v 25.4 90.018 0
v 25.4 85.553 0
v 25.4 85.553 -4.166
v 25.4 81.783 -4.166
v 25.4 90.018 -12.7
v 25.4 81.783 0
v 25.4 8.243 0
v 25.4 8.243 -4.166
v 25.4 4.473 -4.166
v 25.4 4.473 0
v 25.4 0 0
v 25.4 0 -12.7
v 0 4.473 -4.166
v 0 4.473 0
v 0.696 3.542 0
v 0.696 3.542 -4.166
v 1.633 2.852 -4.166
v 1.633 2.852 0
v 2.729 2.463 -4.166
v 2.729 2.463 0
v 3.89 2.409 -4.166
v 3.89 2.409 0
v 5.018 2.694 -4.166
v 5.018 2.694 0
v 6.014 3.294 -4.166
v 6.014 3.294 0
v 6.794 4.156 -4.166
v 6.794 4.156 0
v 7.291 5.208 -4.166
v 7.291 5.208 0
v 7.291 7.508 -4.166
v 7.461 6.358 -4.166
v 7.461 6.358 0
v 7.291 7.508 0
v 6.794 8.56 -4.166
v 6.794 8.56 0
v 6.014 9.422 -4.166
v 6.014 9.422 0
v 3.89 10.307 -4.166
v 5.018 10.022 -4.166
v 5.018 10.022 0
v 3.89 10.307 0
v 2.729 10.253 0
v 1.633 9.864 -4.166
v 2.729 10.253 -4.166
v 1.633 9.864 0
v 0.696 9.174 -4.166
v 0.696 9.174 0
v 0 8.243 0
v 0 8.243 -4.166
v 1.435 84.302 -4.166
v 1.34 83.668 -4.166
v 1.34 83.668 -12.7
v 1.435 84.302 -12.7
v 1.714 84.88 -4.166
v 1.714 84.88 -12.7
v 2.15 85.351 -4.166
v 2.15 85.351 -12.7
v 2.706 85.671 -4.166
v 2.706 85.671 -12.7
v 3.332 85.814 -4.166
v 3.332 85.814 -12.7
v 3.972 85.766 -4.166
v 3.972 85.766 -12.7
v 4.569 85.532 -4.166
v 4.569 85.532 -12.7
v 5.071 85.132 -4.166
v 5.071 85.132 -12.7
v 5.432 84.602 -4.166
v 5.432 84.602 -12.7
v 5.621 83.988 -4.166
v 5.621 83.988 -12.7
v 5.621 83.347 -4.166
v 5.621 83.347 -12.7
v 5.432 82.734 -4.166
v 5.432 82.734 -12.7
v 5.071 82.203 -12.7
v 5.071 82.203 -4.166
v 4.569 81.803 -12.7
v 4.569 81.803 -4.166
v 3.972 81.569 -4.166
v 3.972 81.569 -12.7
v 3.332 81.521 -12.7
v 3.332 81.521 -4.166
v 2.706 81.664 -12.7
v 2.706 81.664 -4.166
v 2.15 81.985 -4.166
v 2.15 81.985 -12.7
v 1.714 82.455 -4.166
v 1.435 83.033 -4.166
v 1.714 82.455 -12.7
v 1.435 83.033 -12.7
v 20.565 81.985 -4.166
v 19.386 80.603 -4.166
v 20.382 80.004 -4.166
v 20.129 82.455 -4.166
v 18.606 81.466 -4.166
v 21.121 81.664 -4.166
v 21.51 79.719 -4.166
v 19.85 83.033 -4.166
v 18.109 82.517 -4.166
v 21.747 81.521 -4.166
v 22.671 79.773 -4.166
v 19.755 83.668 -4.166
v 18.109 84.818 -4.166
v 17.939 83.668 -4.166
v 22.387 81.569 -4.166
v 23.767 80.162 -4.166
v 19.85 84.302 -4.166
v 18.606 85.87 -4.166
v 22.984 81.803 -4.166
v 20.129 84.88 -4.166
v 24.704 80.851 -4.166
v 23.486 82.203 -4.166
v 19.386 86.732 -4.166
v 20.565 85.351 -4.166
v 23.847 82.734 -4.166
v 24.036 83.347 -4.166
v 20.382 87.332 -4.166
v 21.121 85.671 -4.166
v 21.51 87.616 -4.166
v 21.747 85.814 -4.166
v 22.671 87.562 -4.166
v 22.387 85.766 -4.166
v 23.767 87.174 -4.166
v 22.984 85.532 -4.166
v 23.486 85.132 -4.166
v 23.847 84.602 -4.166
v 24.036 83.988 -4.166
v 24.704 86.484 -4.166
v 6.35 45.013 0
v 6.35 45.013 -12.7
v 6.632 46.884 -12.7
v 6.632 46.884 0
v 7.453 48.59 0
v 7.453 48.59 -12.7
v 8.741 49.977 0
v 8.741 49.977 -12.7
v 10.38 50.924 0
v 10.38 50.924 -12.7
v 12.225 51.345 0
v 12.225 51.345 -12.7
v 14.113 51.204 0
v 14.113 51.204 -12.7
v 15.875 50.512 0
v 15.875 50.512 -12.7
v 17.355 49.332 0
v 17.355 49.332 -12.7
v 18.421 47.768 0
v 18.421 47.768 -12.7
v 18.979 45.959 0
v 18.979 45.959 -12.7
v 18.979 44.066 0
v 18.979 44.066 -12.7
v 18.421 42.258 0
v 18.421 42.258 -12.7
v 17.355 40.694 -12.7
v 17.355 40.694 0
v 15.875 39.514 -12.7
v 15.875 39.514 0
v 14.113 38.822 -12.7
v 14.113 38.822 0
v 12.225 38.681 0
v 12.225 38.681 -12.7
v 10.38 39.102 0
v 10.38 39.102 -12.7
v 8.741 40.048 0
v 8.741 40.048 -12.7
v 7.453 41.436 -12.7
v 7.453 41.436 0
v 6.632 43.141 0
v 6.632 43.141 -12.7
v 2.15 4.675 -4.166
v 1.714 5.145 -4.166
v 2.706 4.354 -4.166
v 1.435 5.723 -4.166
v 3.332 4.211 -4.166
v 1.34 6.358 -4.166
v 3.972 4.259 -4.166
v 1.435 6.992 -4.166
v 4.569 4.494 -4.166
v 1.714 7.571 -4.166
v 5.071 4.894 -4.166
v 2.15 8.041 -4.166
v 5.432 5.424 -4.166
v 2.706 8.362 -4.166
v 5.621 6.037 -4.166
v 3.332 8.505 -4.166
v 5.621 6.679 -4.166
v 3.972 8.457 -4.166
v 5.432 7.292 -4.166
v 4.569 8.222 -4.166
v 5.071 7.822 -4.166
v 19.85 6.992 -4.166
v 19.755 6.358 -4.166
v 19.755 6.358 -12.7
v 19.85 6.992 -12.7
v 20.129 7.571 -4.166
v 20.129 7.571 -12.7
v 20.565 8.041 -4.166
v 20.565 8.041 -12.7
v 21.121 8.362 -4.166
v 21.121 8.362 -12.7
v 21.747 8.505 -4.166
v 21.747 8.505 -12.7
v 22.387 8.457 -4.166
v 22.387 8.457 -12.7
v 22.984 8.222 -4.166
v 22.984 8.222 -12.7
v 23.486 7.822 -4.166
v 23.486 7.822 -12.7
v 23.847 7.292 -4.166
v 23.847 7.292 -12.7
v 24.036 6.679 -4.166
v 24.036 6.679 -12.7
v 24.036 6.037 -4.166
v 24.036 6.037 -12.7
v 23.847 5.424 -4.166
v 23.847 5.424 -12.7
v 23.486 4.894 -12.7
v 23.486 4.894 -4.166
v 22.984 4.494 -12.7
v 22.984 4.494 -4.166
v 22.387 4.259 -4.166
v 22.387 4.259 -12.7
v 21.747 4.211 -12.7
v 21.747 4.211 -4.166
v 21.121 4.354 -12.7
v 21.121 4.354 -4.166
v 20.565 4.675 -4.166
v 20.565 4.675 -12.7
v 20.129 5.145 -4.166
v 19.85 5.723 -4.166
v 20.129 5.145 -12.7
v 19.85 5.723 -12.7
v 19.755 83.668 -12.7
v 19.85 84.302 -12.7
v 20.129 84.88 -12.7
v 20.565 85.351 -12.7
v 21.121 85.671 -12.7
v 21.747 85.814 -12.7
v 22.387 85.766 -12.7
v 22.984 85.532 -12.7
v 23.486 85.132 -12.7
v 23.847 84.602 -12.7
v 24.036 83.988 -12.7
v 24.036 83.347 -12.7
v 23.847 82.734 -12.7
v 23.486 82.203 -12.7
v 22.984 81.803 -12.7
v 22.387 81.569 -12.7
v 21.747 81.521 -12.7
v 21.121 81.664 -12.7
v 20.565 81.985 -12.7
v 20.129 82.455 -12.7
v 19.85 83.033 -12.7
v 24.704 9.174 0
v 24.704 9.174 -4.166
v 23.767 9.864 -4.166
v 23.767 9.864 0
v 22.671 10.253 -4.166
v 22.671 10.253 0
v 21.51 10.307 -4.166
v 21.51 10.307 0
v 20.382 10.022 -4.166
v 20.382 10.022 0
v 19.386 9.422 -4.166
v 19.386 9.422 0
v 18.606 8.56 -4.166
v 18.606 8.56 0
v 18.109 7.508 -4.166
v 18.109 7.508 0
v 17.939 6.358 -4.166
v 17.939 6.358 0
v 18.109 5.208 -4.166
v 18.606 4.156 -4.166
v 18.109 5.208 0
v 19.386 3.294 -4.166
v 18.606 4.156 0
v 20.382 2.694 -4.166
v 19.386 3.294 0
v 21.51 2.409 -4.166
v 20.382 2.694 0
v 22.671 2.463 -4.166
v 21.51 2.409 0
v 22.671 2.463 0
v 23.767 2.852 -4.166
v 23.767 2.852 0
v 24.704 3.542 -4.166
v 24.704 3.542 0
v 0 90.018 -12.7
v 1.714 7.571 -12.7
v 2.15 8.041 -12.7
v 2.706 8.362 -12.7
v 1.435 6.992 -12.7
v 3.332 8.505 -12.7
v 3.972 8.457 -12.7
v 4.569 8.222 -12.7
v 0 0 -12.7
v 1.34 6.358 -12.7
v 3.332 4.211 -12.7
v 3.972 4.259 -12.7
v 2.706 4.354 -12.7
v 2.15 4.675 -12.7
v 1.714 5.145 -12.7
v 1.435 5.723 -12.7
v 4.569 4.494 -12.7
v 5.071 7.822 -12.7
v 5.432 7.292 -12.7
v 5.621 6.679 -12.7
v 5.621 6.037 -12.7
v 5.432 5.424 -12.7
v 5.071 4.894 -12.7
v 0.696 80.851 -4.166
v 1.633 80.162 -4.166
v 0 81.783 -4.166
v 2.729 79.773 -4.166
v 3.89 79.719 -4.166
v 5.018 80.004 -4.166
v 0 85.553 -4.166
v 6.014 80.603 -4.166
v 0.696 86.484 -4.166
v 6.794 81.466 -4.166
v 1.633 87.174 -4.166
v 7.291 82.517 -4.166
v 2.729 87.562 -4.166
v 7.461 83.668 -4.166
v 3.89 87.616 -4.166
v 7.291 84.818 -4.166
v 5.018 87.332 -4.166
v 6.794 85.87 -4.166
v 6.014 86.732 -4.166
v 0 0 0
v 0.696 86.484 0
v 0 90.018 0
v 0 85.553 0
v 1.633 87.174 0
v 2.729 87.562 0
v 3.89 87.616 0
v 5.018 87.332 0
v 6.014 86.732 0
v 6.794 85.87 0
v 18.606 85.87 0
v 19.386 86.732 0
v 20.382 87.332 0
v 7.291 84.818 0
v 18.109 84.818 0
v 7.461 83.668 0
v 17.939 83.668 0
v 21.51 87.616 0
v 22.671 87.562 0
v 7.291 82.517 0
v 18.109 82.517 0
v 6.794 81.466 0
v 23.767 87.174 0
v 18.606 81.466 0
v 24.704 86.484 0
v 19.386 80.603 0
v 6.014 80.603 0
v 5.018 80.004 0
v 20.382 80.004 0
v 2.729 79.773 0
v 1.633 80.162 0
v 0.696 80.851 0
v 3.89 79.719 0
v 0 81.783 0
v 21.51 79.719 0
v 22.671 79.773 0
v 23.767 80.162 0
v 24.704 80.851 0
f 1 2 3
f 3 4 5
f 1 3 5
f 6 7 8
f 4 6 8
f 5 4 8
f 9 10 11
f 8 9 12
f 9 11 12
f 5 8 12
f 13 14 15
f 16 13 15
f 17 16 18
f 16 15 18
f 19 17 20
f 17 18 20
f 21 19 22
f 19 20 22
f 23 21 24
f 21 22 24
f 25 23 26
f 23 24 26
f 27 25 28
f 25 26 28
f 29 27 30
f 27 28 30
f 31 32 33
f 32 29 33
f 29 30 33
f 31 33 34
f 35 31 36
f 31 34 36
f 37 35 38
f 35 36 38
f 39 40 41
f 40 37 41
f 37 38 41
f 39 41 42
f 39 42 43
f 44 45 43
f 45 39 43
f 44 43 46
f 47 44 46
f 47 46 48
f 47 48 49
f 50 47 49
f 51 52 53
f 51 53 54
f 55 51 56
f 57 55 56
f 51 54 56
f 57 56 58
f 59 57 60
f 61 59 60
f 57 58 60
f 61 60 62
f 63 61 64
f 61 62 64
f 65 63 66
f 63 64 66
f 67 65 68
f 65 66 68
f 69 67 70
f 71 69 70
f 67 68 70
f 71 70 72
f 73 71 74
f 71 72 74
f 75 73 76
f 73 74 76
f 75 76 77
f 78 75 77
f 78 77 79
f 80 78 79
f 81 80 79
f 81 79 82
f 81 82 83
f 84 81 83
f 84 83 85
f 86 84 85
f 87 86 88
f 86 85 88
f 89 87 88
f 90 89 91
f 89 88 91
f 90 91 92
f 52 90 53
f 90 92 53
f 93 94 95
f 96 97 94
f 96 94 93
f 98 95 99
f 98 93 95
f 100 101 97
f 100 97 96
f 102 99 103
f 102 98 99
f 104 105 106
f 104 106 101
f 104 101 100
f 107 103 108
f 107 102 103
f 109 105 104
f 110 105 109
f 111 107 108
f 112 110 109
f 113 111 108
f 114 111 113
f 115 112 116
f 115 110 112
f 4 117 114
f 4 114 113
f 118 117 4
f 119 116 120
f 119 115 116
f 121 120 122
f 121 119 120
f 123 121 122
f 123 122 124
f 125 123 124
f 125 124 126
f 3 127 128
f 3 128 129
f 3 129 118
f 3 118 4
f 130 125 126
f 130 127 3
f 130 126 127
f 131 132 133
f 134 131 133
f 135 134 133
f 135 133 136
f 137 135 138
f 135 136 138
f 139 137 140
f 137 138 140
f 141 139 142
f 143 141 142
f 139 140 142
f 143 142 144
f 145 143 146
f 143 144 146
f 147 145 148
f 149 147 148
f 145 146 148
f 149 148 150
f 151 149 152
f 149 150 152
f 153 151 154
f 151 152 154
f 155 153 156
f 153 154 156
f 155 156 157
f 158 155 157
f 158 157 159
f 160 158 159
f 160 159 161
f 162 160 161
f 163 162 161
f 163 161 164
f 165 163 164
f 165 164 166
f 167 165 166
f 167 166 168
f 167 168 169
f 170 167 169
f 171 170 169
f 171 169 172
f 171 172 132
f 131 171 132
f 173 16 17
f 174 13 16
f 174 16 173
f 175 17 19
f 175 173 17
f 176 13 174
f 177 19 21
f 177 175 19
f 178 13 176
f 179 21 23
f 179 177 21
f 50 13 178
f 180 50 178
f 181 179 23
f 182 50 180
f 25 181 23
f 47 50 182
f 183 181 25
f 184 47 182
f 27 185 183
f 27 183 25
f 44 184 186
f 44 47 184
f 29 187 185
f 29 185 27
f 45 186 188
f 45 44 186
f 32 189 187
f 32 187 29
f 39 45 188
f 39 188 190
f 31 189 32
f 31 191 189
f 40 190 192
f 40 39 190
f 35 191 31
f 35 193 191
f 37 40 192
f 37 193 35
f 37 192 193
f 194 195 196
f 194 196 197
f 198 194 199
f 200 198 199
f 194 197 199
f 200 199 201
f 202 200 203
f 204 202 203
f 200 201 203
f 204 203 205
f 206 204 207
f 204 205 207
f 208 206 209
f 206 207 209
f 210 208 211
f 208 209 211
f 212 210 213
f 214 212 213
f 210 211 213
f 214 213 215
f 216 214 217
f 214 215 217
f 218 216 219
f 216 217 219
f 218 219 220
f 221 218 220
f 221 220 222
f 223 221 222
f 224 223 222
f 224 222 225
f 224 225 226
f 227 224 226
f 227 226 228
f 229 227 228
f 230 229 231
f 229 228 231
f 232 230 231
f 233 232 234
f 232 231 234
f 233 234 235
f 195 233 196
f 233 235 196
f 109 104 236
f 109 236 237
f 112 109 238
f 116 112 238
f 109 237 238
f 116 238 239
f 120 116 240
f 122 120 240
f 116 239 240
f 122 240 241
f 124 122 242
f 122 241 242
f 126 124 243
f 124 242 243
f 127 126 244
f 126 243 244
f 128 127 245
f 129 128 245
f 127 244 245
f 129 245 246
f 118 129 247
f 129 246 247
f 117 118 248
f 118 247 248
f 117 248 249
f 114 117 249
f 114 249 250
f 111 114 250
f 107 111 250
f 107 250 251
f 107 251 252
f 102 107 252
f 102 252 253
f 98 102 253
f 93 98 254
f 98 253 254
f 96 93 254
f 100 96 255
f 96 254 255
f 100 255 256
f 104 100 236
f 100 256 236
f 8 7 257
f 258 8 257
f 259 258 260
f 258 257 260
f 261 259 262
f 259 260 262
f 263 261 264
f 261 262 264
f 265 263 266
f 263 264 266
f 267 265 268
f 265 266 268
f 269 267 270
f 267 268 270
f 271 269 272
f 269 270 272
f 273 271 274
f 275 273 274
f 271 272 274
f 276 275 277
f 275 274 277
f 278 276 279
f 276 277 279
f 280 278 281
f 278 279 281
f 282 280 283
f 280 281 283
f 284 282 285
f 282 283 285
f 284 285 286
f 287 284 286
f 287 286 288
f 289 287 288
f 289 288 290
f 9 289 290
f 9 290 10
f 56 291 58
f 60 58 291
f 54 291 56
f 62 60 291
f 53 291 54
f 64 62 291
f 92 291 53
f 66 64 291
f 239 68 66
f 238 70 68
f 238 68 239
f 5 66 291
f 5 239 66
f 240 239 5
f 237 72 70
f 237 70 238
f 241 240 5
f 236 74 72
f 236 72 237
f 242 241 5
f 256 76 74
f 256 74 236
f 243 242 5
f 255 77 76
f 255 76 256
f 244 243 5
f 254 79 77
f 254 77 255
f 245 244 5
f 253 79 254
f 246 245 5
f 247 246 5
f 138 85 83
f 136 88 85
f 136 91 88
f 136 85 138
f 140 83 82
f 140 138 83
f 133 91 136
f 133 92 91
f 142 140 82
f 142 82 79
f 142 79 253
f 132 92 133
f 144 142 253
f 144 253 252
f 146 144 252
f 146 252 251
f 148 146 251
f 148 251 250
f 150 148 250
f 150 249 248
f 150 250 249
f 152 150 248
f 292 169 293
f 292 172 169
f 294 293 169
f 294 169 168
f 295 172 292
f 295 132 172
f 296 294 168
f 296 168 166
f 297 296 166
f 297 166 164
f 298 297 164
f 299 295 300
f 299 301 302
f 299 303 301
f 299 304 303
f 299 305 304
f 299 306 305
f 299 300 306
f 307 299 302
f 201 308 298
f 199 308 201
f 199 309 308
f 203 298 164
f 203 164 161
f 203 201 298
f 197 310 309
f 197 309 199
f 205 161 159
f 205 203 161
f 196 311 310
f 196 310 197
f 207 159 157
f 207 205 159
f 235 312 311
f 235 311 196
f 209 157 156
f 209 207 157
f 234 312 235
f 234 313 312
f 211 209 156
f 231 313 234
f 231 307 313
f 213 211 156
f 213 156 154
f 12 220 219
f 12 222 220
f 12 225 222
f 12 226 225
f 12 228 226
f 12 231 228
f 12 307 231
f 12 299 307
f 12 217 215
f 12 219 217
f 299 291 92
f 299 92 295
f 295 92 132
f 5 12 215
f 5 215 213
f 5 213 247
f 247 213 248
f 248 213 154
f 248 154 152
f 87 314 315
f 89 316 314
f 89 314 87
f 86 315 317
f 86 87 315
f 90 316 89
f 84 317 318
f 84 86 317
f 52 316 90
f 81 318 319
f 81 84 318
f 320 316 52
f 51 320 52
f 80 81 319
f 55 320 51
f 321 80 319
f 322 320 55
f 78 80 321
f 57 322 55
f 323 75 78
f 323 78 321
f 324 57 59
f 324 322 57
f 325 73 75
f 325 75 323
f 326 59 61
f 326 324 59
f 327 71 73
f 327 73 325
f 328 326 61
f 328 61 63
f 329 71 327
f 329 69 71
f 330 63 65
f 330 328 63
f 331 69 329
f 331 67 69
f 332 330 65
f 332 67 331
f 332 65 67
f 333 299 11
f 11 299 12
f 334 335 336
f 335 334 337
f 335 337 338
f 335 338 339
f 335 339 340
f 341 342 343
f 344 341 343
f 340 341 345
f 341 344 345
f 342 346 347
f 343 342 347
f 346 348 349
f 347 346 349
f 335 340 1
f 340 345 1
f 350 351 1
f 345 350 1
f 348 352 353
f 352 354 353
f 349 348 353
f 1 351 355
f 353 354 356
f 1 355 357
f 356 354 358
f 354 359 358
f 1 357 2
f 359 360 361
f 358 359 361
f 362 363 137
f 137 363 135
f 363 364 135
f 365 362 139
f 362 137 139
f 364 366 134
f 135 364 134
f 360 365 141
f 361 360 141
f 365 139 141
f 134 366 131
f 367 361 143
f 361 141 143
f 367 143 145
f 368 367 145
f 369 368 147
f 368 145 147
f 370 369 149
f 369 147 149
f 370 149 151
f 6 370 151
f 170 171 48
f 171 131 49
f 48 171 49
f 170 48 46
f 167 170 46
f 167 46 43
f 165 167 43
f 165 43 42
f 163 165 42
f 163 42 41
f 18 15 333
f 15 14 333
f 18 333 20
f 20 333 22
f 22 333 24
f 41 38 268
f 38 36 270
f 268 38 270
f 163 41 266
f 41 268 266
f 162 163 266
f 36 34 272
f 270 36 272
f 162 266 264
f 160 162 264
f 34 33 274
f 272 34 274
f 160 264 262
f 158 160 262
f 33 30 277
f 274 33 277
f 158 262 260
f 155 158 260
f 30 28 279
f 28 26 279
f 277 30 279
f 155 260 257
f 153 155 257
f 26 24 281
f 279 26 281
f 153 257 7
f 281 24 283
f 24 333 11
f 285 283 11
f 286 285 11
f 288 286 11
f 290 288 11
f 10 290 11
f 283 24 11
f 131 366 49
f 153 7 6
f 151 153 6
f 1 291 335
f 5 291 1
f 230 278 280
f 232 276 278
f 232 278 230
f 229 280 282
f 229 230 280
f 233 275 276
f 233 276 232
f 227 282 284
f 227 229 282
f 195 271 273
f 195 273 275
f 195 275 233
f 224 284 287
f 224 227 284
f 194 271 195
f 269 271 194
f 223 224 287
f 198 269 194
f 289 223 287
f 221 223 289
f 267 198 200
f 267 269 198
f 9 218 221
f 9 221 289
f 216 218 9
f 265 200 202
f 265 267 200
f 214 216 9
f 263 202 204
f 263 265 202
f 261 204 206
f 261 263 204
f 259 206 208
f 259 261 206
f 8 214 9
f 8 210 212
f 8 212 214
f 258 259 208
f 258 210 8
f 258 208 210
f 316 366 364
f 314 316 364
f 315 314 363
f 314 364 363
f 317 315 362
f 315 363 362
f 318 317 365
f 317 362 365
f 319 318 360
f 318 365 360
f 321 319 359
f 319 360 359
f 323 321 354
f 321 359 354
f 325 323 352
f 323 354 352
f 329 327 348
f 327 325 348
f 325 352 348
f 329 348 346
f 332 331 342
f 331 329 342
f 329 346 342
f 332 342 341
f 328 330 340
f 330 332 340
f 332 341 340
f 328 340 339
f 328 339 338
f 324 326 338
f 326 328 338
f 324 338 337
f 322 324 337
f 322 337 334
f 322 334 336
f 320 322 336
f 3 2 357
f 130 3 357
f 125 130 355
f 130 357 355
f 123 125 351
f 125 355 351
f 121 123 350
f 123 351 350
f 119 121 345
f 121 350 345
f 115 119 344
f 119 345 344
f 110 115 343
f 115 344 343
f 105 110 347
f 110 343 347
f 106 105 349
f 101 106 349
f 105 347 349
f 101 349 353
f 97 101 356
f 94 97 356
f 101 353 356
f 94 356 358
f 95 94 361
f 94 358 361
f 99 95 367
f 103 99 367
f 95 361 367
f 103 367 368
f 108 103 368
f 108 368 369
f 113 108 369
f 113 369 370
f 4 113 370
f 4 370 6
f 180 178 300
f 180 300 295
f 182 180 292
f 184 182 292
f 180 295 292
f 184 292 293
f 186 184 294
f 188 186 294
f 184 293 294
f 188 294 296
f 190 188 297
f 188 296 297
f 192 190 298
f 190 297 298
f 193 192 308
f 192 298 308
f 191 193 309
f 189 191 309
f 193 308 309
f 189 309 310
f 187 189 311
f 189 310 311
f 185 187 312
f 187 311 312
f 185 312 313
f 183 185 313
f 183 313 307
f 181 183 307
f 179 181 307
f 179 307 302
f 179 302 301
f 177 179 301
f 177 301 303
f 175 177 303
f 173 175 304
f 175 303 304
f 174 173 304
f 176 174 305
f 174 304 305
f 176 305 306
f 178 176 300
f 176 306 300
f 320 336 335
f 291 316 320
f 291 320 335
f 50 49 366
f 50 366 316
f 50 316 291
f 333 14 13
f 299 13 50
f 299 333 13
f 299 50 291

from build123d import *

# Parameters (mm, degrees)
SKETCH1_W                                      = 25.4
SKETCH1_H                                      = 12.7
BOSS_EXTRUDE1_DEPTH                            = 90.0176
CBORE_FOR_8_SOCKET_HEAD_CAP_SCREW1_D           = 4.3053
CBORE_FOR_8_SOCKET_HEAD_CAP_SCREW1_DEPTH       = 19.05
CBORE_FOR_8_SOCKET_HEAD_CAP_SCREW1_CBORE_D     = 7.9375
CBORE_FOR_8_SOCKET_HEAD_CAP_SCREW1_CBORE_DEPTH = 4.1656
CBORE_FOR_8_SOCKET_HEAD_CAP_SCREW1_TIP         = 1.293442612
F_1_2_0_5_DIAMETER_HOLE1_D                     = 12.7
F_1_2_0_5_DIAMETER_HOLE1_DEPTH                 = 15.24
F_1_2_0_5_DIAMETER_HOLE1_TIP                   = 3.815464931


with BuildPart() as part:
    # Sketch1 → Boss-Extrude1 (new body)
    with BuildSketch(Plane(origin=(0, 0, 0), x_dir=(1, 0, 0), z_dir=(0, 1, 0))):
        with Locations((12.7, 6.35)):
            Rectangle(SKETCH1_W, SKETCH1_H)
    extrude(amount=BOSS_EXTRUDE1_DEPTH)

    # CBORE for #8 Socket Head Cap Screw1
    with Locations(Plane(origin=(3.4925, 6.357975427, 0), x_dir=(1, 0, 0), z_dir=(0, 0, 1))):
        with Locations((0, 0), (18.415, 0), (18.415, 77.309624573), (0, 77.309624573)):
            CounterBoreHole(CBORE_FOR_8_SOCKET_HEAD_CAP_SCREW1_D / 2, CBORE_FOR_8_SOCKET_HEAD_CAP_SCREW1_CBORE_D / 2, CBORE_FOR_8_SOCKET_HEAD_CAP_SCREW1_CBORE_DEPTH, depth=CBORE_FOR_8_SOCKET_HEAD_CAP_SCREW1_DEPTH)
            with Locations((0, 0, -(CBORE_FOR_8_SOCKET_HEAD_CAP_SCREW1_DEPTH + CBORE_FOR_8_SOCKET_HEAD_CAP_SCREW1_TIP / 2))):  # 118° drill point
                Cone(0, CBORE_FOR_8_SOCKET_HEAD_CAP_SCREW1_D / 2, CBORE_FOR_8_SOCKET_HEAD_CAP_SCREW1_TIP, mode=Mode.SUBTRACT)

    # 1/2 (0.5) Diameter Hole1
    with Locations(Plane(origin=(12.7, 45.012787713, 0), x_dir=(1, 0, 0), z_dir=(0, 0, 1))):
        with Locations((0, 0)):
            Hole(F_1_2_0_5_DIAMETER_HOLE1_D / 2, depth=F_1_2_0_5_DIAMETER_HOLE1_DEPTH)
            with Locations((0, 0, -(F_1_2_0_5_DIAMETER_HOLE1_DEPTH + F_1_2_0_5_DIAMETER_HOLE1_TIP / 2))):  # 118° drill point
                Cone(0, F_1_2_0_5_DIAMETER_HOLE1_D / 2, F_1_2_0_5_DIAMETER_HOLE1_TIP, mode=Mode.SUBTRACT)


solid = part.part
